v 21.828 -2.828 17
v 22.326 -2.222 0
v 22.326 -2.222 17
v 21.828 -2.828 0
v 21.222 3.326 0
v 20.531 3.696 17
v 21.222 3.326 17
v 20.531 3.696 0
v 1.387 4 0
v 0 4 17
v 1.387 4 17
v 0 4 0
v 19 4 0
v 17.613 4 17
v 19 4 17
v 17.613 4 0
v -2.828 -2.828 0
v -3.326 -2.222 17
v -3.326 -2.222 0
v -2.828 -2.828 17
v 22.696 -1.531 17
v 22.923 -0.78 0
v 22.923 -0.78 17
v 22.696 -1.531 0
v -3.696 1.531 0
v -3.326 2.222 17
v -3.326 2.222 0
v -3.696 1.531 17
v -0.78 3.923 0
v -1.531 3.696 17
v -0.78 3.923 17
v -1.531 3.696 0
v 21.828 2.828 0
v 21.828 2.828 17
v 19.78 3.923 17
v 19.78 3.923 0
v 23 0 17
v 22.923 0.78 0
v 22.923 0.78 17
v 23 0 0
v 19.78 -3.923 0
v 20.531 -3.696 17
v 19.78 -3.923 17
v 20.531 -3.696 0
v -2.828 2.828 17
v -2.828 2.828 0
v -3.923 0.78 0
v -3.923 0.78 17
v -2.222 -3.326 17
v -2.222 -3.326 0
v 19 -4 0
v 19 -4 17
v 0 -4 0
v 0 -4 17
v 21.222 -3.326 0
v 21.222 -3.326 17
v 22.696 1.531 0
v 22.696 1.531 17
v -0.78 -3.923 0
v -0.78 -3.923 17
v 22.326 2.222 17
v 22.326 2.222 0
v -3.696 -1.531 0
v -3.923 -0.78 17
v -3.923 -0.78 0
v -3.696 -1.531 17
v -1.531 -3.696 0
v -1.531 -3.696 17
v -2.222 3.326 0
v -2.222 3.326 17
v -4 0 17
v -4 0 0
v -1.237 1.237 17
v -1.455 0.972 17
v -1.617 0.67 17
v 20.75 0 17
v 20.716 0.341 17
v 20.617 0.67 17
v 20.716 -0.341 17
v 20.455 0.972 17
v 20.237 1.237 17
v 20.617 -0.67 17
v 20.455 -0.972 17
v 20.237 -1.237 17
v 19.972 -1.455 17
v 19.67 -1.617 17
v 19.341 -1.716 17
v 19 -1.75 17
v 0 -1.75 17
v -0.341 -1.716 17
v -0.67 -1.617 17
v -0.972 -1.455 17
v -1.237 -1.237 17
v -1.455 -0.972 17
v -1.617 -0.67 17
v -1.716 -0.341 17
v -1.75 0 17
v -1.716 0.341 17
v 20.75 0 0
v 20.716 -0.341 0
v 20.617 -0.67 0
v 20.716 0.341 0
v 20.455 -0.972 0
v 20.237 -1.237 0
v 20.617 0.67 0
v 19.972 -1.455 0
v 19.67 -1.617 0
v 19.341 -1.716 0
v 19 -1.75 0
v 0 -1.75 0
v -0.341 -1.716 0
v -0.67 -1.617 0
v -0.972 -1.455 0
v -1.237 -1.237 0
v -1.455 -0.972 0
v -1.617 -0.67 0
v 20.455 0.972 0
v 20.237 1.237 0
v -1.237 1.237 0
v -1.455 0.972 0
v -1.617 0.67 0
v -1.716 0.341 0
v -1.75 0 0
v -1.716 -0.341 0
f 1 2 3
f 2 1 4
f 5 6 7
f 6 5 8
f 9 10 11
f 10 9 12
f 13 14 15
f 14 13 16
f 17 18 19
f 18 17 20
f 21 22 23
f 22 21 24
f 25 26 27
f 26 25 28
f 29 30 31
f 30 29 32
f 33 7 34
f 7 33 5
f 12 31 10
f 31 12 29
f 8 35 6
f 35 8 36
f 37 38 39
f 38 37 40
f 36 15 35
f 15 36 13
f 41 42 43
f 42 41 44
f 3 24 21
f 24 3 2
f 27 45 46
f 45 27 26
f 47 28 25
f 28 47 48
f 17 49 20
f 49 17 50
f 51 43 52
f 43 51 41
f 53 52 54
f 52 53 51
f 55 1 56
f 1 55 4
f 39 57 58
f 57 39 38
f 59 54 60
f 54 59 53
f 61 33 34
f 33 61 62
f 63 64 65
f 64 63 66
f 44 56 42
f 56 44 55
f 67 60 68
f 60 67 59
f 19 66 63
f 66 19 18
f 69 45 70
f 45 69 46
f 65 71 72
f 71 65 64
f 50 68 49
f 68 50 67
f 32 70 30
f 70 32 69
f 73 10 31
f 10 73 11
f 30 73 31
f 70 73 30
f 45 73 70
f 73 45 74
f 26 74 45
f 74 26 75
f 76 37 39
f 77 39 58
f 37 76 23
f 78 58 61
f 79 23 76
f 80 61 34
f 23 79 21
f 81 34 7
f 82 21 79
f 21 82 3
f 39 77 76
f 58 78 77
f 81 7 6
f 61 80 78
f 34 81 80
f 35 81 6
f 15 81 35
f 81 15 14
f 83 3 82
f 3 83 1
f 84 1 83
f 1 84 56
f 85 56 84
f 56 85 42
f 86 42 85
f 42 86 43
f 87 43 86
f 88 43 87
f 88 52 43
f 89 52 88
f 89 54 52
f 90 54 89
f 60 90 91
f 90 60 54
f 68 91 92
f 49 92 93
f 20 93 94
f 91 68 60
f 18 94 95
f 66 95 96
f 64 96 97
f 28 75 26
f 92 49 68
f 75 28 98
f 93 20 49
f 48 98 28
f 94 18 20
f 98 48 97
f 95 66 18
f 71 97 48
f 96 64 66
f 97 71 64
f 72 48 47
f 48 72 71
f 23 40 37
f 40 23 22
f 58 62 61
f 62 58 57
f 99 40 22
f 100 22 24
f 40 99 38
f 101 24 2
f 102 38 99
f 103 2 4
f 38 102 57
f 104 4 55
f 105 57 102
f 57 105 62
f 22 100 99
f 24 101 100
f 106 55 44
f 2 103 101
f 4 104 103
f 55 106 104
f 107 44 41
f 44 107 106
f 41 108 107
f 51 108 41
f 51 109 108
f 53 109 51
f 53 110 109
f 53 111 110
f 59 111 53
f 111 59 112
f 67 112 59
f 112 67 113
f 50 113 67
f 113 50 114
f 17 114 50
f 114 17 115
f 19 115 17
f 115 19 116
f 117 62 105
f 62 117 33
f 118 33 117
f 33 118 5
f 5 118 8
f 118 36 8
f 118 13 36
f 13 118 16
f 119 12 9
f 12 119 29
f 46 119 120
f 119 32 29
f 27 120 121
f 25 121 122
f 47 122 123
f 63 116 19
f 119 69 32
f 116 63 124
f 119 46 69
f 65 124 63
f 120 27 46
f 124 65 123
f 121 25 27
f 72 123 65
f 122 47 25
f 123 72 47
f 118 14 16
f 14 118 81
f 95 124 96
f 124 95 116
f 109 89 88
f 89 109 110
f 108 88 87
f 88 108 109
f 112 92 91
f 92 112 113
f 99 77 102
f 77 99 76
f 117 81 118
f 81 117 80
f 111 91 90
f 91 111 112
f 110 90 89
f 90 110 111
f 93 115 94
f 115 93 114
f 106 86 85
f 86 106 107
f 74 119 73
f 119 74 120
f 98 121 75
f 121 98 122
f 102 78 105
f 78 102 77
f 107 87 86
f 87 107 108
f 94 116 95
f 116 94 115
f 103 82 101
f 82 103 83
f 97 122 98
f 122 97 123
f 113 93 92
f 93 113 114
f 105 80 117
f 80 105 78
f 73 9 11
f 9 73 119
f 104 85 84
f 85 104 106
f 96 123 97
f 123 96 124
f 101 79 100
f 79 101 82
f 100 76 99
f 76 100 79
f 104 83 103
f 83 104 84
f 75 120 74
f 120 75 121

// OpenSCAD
$fn=32;
distancia=19;
difference(){
hull(){
cylinder(r=8/2,17);
translate([distancia,0,0])cylinder(r=8/2,17);
}
translate([0,0,-2])
hull(){
cylinder(r=3.5/2,20);
translate([distancia,0,0])cylinder(r=3.5/2,20);
translate([distancia/2,10,0])cylinder(r=3.5/2,20);
}
}
